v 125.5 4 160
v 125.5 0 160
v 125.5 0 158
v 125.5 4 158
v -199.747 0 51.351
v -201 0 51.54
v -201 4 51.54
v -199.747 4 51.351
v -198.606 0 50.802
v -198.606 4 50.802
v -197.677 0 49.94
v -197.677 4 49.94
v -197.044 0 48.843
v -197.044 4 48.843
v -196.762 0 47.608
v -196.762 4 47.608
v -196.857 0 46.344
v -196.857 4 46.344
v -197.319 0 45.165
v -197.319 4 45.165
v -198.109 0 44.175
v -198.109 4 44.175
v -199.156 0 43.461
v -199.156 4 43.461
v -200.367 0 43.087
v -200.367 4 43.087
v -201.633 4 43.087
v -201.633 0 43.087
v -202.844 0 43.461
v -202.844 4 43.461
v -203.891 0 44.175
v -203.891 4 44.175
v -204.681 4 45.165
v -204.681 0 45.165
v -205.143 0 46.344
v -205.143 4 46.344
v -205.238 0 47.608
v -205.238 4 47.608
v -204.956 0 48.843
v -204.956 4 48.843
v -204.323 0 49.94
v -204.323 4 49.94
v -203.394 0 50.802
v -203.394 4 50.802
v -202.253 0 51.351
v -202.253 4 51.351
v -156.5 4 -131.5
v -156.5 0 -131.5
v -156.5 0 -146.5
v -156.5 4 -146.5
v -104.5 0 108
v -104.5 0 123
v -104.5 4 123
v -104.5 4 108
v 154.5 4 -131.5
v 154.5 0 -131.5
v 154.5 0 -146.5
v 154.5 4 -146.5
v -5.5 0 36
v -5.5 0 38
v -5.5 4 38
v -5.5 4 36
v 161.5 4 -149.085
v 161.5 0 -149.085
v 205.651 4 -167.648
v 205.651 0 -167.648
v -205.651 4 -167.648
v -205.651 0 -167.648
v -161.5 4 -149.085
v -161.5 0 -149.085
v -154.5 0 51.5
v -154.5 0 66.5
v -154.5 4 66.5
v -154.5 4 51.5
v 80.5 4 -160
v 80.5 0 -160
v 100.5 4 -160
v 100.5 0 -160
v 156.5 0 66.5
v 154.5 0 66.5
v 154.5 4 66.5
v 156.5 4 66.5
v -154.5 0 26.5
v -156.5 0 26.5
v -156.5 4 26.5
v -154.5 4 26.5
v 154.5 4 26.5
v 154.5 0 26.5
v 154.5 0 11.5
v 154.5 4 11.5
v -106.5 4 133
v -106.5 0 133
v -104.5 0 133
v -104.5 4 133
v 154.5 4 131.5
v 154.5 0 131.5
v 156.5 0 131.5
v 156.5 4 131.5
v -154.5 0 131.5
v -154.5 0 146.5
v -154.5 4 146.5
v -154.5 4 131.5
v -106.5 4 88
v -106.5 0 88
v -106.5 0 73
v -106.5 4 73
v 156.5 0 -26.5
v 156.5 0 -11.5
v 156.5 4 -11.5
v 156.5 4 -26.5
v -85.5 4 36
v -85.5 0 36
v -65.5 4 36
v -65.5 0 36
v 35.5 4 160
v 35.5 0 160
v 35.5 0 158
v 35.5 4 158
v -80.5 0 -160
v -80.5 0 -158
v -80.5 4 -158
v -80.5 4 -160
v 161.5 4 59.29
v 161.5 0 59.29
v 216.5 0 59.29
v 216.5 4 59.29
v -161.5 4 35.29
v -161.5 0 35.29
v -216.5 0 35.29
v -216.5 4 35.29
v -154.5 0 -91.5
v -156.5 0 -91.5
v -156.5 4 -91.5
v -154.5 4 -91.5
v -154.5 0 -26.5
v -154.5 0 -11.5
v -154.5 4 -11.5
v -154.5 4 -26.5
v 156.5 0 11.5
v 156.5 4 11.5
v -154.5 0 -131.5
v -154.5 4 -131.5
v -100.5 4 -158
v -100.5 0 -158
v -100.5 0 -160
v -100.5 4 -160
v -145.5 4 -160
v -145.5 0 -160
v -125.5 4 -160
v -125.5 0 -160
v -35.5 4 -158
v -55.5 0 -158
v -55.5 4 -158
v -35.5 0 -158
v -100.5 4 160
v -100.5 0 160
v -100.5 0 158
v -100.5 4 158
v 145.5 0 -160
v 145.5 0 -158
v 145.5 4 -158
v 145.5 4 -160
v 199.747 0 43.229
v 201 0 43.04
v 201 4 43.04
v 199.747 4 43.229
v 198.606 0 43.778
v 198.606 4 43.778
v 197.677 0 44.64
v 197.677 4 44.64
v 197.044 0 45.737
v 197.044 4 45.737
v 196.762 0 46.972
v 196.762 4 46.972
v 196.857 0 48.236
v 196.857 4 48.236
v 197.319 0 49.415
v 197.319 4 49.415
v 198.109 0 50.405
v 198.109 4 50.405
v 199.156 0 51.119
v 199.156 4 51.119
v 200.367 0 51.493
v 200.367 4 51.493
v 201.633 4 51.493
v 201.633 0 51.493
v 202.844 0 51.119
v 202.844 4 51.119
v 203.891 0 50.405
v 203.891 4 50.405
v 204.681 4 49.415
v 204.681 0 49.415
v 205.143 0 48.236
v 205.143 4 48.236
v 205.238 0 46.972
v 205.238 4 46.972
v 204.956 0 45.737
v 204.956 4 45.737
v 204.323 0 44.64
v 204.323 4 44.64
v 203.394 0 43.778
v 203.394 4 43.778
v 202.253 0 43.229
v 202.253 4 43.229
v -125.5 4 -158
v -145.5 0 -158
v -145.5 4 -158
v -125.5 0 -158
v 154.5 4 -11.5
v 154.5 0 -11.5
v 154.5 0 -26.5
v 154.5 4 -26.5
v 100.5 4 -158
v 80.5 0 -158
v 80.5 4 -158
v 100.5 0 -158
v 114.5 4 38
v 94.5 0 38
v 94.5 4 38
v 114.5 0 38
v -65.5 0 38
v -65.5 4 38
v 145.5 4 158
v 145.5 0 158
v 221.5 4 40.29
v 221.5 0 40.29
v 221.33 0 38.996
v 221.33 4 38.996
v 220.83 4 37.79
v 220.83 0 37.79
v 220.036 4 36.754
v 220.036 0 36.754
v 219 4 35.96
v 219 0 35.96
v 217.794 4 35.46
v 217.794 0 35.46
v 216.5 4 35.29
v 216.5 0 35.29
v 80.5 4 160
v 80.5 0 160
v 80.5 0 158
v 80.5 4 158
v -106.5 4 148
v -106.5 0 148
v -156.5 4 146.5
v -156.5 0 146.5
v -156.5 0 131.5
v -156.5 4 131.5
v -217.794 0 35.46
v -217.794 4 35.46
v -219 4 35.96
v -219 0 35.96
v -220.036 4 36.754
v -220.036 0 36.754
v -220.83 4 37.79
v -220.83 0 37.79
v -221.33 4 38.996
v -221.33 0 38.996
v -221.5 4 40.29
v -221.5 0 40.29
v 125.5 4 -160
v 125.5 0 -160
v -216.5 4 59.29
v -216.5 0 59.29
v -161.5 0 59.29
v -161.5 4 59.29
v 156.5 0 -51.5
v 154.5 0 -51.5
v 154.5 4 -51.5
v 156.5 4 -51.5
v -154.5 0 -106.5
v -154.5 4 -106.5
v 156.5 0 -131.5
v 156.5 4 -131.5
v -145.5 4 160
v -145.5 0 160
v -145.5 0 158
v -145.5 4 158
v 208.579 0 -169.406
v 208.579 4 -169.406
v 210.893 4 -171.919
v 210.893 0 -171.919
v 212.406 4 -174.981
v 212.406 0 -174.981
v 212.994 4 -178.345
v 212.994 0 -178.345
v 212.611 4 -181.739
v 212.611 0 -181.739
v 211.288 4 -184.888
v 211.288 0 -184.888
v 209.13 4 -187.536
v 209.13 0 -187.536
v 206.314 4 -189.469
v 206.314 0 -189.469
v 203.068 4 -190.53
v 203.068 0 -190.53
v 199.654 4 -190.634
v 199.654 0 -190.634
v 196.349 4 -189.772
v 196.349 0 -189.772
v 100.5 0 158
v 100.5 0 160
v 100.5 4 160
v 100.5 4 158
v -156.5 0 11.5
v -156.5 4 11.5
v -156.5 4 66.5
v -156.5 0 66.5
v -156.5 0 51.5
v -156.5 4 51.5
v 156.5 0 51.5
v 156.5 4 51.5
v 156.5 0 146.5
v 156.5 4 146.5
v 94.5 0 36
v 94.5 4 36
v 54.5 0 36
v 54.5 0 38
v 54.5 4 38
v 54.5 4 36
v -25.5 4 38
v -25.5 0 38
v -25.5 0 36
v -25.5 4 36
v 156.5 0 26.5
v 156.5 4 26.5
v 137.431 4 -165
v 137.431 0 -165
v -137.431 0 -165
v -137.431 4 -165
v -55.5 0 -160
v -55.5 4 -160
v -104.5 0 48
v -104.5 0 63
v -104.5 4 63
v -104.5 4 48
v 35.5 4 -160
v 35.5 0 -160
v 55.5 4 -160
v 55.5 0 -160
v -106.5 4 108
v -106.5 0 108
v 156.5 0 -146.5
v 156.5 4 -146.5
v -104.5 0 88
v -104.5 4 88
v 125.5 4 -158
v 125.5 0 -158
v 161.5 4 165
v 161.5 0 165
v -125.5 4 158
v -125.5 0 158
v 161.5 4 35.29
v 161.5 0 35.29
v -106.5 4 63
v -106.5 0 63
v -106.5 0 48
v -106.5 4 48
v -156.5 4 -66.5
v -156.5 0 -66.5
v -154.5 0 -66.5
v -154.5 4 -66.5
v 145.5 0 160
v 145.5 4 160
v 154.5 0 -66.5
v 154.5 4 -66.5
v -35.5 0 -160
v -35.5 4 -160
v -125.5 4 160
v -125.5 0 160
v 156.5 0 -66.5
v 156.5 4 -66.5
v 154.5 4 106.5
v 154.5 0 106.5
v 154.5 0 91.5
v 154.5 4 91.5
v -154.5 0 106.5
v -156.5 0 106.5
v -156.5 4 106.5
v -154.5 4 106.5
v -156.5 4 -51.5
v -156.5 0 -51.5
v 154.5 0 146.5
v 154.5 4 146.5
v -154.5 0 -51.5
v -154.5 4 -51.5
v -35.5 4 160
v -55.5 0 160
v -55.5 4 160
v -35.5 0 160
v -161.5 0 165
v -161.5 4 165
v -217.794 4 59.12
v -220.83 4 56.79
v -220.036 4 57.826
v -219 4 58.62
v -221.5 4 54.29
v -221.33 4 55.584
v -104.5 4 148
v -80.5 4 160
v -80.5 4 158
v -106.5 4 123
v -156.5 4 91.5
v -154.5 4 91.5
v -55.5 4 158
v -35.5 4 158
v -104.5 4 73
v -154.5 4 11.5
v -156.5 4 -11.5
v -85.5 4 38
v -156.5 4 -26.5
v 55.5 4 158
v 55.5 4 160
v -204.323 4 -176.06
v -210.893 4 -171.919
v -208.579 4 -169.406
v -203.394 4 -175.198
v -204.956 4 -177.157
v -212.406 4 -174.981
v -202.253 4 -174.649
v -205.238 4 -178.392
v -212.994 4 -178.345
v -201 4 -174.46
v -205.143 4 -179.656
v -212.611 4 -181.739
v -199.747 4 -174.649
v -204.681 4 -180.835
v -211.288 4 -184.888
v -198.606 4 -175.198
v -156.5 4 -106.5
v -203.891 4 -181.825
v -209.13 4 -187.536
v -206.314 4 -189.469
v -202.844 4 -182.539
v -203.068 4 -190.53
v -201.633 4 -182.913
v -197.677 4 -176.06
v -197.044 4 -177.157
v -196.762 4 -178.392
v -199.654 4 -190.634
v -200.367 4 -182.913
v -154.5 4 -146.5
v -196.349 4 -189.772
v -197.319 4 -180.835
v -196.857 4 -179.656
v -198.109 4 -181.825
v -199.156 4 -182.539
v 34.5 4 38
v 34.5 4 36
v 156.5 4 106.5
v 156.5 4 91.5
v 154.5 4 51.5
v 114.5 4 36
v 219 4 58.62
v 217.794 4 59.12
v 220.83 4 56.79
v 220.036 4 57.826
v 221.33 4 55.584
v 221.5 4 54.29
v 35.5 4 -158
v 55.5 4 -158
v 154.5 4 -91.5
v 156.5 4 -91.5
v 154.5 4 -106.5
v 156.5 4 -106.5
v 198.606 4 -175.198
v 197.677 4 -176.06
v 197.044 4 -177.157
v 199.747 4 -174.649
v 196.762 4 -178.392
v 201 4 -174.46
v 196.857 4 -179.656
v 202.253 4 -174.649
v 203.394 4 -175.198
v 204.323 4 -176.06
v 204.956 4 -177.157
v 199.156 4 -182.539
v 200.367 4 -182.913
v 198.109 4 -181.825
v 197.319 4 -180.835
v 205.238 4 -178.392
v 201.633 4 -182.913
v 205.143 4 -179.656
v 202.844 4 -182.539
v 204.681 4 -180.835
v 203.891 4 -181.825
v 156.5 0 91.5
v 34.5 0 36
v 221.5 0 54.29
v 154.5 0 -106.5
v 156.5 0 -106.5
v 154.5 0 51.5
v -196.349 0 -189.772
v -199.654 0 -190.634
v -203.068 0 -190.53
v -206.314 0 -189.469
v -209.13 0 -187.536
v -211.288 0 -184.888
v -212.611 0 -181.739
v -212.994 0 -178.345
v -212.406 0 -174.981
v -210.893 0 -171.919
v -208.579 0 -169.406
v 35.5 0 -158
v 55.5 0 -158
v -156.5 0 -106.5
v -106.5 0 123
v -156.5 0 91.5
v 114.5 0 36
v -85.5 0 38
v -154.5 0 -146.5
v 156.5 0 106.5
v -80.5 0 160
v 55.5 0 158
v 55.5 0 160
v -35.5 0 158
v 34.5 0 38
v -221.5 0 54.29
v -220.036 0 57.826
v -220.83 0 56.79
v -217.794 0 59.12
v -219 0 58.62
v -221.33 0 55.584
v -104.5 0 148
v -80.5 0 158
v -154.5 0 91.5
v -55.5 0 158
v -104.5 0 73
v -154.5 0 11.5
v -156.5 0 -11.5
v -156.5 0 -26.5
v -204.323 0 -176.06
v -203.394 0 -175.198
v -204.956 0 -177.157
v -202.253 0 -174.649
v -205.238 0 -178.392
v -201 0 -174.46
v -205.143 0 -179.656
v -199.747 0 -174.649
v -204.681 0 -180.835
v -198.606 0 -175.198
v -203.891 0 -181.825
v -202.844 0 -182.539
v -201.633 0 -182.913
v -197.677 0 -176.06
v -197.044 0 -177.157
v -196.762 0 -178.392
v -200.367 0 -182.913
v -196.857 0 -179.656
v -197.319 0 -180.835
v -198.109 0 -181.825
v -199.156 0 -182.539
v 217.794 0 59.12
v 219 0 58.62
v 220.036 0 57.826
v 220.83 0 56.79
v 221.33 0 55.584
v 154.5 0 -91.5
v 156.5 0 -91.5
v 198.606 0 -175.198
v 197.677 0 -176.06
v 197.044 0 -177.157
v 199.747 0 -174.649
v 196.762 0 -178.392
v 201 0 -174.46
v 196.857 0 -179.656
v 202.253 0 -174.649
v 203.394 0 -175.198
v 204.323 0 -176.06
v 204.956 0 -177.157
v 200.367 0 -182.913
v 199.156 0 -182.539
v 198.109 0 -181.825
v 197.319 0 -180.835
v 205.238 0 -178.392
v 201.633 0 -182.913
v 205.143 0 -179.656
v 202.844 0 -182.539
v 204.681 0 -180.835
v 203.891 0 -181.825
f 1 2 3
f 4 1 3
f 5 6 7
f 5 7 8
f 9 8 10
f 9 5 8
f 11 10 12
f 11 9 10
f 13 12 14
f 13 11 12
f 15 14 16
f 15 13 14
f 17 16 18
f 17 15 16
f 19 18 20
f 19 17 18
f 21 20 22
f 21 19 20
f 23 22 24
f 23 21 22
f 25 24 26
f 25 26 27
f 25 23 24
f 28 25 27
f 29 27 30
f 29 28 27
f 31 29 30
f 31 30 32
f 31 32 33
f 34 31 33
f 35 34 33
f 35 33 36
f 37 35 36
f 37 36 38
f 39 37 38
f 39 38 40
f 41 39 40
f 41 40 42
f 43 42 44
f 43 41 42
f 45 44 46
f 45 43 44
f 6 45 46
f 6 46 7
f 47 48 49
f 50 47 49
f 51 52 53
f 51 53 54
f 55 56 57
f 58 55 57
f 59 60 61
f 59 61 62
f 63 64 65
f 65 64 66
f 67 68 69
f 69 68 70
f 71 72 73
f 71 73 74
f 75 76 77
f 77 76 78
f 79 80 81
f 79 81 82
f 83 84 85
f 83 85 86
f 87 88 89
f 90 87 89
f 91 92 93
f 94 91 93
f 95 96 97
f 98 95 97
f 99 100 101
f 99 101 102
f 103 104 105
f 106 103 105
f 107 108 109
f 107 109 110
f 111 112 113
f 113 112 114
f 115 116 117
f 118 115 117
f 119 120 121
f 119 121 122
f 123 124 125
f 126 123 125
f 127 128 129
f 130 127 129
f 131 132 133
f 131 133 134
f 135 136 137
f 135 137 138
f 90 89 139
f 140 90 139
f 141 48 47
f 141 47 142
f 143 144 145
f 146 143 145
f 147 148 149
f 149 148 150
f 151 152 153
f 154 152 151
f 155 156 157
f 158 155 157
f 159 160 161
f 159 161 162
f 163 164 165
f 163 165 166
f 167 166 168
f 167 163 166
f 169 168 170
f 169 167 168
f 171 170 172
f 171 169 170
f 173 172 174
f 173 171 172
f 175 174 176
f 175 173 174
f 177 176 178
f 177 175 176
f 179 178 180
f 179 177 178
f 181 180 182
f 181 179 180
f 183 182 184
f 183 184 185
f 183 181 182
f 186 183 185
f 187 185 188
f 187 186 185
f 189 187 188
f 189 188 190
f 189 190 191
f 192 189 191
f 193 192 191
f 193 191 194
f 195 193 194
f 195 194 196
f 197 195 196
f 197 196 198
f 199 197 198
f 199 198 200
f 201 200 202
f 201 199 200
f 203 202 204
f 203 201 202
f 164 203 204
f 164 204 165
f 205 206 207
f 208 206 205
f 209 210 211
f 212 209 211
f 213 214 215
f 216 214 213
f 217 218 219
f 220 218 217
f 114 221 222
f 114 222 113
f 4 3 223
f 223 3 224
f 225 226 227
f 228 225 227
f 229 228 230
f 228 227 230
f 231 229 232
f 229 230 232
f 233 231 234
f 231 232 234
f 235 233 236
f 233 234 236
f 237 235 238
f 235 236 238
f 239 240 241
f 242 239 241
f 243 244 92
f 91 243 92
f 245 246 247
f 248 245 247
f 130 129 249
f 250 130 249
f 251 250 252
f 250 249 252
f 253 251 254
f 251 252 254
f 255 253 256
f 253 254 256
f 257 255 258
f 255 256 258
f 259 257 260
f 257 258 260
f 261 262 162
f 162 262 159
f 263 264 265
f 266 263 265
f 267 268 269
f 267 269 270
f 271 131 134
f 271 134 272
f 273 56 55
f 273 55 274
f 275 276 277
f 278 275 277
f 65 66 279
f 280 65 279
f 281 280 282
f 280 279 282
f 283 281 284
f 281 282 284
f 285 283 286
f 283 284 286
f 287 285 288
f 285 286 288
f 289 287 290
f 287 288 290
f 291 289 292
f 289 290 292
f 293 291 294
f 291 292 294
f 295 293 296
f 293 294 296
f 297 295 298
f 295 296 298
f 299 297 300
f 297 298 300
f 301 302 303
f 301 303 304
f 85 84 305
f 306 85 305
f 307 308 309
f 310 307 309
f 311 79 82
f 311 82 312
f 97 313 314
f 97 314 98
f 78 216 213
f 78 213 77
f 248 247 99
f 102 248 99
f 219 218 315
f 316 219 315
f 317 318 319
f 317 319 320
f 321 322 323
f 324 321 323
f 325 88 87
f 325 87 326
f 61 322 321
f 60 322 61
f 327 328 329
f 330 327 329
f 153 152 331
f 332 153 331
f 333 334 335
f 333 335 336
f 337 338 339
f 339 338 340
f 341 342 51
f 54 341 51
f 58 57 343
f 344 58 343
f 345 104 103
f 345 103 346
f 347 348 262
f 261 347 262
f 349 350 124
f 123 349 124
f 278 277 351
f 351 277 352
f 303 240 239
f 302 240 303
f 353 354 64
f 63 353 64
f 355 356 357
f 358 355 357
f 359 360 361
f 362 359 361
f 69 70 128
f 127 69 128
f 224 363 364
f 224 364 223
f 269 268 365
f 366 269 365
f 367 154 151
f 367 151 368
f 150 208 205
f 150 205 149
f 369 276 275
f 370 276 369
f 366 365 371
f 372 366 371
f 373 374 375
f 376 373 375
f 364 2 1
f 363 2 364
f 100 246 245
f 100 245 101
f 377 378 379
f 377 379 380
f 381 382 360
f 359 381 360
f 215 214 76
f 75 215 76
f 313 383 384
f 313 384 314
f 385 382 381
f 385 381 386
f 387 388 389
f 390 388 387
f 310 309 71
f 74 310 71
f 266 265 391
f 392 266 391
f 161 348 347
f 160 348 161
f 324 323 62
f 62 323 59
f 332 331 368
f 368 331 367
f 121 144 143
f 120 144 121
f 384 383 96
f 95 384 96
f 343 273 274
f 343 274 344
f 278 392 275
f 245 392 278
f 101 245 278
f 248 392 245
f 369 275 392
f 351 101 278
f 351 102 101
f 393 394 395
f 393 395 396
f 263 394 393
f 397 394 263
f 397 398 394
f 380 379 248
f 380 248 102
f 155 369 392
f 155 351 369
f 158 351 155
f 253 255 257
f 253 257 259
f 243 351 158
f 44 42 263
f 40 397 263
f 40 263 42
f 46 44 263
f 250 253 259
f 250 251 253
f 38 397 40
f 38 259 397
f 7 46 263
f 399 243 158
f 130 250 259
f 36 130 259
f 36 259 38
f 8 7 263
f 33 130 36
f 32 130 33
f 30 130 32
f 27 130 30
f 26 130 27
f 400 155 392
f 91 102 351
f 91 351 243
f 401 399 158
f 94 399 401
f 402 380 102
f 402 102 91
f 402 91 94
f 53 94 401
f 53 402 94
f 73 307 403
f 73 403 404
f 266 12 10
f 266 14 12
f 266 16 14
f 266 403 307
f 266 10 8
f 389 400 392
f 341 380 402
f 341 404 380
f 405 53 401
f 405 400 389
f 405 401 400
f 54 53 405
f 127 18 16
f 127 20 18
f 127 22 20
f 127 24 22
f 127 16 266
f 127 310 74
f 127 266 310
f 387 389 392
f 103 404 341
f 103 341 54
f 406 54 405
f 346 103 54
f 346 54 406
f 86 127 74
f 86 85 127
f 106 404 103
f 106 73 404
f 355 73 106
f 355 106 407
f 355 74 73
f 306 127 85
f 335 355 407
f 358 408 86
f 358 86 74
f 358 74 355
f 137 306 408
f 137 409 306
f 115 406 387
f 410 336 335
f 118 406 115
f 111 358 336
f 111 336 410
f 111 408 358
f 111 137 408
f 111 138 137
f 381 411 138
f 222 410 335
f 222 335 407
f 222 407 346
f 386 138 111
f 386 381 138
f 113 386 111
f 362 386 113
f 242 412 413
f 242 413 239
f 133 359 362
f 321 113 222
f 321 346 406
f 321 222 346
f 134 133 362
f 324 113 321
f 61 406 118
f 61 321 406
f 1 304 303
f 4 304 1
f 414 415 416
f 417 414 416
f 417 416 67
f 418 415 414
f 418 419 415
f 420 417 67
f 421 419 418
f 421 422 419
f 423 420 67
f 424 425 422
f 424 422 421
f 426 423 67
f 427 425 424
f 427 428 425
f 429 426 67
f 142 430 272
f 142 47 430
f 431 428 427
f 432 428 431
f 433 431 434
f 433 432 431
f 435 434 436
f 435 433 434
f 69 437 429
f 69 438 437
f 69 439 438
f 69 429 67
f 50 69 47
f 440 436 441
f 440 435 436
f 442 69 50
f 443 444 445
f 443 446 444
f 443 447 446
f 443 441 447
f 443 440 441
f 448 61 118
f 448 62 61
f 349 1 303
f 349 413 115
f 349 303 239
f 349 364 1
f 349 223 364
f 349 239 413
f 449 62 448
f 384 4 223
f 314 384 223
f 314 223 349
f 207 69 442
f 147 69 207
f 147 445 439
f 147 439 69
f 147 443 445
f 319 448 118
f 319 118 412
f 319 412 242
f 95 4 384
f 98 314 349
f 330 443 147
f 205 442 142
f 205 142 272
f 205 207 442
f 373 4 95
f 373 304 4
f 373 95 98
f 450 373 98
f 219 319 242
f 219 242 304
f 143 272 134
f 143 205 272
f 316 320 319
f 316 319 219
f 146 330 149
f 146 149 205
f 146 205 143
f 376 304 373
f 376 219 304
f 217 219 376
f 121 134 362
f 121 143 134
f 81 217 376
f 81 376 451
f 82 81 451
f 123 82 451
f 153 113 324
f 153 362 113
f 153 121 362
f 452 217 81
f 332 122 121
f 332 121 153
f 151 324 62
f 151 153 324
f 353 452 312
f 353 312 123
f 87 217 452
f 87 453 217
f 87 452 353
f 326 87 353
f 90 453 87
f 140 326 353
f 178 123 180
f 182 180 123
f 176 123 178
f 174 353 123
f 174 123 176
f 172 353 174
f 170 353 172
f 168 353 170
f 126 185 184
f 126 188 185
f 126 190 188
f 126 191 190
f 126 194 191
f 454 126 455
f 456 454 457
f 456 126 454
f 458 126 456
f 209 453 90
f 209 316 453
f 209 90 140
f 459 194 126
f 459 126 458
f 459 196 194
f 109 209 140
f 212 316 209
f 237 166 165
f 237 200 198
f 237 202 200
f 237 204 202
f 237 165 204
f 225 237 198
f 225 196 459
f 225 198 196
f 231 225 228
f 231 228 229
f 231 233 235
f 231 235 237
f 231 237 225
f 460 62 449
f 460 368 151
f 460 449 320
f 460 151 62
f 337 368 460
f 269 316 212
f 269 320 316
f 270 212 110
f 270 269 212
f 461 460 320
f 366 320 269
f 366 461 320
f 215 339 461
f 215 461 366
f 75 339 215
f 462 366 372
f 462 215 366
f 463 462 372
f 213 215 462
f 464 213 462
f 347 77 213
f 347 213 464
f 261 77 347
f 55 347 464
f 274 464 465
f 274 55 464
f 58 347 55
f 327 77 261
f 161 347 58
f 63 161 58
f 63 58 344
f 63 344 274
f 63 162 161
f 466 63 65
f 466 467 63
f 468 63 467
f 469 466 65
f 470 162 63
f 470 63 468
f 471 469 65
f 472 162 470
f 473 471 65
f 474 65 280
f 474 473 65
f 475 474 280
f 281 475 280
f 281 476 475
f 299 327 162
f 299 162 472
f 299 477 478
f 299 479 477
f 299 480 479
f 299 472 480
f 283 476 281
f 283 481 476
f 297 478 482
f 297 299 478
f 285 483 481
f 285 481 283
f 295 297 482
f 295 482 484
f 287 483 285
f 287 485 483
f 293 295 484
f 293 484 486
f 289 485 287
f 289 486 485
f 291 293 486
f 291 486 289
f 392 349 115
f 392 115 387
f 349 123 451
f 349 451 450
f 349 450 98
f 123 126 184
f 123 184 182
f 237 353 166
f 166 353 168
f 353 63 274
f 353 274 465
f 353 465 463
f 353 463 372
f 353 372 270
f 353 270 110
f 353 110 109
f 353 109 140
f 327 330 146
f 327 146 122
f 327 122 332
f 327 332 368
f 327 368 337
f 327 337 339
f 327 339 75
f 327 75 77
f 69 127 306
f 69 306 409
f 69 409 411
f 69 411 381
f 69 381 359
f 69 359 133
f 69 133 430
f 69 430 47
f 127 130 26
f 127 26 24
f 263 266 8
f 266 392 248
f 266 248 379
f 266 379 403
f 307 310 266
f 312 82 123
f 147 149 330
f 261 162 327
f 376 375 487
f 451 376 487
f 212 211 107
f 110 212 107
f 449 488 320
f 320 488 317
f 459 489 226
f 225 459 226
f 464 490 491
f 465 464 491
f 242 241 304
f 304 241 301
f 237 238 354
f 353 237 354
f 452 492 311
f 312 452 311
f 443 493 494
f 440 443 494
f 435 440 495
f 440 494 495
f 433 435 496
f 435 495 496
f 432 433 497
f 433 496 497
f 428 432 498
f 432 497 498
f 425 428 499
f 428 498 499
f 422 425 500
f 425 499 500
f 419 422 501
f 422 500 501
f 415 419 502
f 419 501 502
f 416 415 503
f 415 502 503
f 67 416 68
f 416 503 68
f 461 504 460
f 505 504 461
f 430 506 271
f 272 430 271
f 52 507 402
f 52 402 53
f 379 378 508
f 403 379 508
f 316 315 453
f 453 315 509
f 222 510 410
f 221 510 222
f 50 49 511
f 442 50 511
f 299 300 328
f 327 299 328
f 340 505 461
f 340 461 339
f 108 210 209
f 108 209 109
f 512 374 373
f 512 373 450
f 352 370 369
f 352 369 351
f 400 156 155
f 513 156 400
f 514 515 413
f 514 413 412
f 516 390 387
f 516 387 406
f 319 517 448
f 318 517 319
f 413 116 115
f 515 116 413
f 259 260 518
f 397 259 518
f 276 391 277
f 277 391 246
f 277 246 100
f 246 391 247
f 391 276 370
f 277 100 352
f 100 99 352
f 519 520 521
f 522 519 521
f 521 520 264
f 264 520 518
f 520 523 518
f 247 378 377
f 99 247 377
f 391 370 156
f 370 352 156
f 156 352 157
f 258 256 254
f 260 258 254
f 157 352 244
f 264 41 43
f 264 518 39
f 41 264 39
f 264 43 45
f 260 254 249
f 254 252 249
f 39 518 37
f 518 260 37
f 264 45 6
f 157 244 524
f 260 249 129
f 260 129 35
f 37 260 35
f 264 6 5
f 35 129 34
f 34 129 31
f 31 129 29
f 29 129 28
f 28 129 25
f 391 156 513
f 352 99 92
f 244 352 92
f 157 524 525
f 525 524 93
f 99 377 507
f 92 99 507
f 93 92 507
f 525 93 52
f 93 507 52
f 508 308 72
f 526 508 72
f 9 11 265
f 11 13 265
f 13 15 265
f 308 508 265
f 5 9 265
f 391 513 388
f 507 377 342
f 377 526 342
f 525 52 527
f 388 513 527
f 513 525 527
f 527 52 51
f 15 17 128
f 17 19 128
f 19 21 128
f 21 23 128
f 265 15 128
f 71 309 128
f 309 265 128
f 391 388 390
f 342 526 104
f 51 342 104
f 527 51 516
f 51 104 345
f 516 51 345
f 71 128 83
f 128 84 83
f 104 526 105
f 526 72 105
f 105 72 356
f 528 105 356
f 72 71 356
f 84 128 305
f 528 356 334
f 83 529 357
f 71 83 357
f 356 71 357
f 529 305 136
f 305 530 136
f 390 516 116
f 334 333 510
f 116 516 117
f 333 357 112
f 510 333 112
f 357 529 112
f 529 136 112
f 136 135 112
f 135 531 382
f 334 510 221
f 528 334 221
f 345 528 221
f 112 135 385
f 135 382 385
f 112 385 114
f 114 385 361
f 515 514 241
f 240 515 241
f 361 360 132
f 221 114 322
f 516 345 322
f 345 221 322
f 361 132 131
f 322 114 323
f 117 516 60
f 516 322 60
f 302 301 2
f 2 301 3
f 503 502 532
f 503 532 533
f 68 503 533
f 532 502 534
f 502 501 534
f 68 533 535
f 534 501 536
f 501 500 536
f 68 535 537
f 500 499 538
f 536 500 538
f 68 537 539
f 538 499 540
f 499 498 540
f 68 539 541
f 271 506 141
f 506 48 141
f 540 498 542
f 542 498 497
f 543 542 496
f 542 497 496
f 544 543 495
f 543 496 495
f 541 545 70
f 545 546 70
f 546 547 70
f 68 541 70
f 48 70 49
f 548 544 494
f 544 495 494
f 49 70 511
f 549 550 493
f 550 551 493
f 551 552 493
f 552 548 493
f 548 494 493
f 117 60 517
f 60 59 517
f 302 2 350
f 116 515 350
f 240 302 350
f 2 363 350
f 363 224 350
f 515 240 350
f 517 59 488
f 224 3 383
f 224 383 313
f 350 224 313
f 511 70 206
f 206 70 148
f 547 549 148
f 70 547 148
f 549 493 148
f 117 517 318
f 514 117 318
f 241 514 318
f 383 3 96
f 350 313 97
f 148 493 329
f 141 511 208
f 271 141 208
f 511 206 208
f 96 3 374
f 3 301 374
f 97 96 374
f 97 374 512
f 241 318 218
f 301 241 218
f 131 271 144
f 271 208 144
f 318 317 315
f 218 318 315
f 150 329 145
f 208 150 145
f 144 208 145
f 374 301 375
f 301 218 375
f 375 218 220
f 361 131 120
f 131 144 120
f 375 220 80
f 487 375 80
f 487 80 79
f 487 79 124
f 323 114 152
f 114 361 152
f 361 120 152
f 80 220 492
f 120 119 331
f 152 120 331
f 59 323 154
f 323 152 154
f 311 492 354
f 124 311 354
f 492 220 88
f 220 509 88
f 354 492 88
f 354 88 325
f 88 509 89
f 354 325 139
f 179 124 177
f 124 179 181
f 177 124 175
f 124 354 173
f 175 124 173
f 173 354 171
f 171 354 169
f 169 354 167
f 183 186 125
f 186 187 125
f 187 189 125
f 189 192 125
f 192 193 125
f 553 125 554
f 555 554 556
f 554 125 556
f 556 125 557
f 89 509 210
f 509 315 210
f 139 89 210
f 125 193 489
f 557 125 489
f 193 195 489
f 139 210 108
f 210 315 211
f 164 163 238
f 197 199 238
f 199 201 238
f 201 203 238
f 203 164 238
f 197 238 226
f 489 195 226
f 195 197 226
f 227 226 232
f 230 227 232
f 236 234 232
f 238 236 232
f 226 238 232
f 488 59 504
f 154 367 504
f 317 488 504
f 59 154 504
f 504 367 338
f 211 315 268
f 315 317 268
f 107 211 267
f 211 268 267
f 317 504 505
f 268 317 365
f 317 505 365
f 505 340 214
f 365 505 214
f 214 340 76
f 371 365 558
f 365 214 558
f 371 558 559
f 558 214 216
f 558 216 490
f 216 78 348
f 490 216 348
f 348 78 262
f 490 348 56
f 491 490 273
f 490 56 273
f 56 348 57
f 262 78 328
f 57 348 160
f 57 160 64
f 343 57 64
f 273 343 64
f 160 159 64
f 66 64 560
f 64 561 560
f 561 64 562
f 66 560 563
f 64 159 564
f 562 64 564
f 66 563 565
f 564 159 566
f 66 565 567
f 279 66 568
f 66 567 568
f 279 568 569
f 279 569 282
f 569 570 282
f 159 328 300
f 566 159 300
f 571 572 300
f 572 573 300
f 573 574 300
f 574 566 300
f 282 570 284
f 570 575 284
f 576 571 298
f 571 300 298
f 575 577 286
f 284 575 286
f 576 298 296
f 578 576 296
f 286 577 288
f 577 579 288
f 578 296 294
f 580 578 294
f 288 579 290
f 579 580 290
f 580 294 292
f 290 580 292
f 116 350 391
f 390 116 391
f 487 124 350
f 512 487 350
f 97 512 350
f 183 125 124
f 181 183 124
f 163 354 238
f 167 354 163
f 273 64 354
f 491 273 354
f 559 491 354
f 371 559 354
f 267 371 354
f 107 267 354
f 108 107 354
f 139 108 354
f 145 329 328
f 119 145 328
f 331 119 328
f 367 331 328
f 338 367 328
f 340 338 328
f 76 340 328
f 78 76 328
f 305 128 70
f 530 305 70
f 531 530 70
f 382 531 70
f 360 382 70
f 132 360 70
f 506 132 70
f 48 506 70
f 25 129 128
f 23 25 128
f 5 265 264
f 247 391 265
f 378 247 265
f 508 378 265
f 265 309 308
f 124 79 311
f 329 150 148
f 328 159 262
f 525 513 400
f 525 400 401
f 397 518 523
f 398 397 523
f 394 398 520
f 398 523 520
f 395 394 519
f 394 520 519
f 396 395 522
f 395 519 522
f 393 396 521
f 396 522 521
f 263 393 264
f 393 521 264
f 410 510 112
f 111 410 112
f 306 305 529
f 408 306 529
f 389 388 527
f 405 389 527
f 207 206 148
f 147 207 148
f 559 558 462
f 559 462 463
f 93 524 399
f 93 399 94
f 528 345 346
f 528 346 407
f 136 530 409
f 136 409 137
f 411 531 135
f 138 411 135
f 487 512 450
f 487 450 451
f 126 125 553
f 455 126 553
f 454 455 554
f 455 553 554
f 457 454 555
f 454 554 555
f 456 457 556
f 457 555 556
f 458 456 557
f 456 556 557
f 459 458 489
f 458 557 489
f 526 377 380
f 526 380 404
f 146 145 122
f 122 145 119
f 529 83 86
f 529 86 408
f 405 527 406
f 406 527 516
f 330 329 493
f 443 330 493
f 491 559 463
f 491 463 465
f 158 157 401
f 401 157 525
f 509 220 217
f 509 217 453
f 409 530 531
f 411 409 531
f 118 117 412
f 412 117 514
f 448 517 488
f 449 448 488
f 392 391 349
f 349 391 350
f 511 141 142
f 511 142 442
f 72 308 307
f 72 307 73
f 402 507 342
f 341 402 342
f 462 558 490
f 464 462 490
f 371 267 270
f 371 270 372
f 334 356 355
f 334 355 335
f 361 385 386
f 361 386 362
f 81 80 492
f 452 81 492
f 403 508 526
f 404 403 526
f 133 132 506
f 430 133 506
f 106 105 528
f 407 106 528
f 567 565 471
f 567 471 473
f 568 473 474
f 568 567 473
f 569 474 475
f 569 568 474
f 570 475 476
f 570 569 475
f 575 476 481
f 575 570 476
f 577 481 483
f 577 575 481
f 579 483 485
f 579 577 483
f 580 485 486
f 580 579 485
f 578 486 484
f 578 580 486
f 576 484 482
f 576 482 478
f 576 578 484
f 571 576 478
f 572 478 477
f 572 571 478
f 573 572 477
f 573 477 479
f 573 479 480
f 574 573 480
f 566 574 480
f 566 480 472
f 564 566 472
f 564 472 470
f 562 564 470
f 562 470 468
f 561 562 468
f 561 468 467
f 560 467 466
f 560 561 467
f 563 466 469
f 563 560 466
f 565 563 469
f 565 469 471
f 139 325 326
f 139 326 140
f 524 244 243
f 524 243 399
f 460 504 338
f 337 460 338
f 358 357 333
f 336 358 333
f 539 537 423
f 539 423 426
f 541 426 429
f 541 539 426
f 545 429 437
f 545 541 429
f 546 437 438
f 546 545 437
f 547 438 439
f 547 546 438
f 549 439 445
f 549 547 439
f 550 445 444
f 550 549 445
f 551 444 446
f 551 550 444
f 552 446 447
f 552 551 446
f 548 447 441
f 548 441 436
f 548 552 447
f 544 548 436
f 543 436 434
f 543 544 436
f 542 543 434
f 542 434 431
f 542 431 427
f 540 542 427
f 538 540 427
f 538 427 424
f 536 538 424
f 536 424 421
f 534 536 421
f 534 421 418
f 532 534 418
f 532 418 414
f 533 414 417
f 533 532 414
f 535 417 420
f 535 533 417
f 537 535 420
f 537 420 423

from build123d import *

# Parameters (mm, degrees)
SKETCH1_R           = 4.25
SKETCH1_W           = 2
SKETCH1_H           = 15
SKETCH1_W_2         = 20
SKETCH1_H_2         = 2
BOSS_EXTRUDE1_DEPTH = 4


with BuildPart() as part:
    # Sketch1 → Boss-Extrude1 (new body)
    with BuildSketch(Plane(origin=(0, 0, 0), x_dir=(1, 0, 0), z_dir=(0, 1, 0))):
        with BuildLine():
            Line((-161.5, -165), (161.5, -165))
            Line((161.5, -165), (161.5, -59.29))
            Line((161.5, -59.29), (216.5, -59.29))
            ThreePointArc((216.5, -59.29), (220.035533906, -57.825533906), (221.5, -54.29))
            Line((221.5, -54.29), (221.5, -47.29))
            Line((221.5, -47.29), (221.5, -40.29))
            ThreePointArc((221.5, -40.29), (220.035533906, -36.754466094), (216.5, -35.29))
            Line((216.5, -35.29), (161.5, -35.29))
            Line((161.5, -35.29), (161.5, 149.084720808))
            Line((161.5, 149.084720808), (205.651015663, 167.64799054))
            ThreePointArc((205.651015663, 167.64799054), (212.06200946, 183.361015663), (196.348984337, 189.77200946))
            Line((196.348984337, 189.77200946), (137.431056973, 165))
            Line((137.431056973, 165), (-137.431056973, 165))
            Line((-137.431056973, 165), (-196.348984337, 189.77200946))
            ThreePointArc((-196.348984337, 189.77200946), (-212.06200946, 183.361015663), (-205.651015663, 167.64799054))
            Line((-205.651015663, 167.64799054), (-161.5, 149.084720808))
            Line((-161.5, 149.084720808), (-161.5, -35.29))
            Line((-161.5, -35.29), (-216.5, -35.29))
            ThreePointArc((-216.5, -35.29), (-220.035533906, -36.754466094), (-221.5, -40.29))
            Line((-221.5, -40.29), (-221.5, -47.29))
            Line((-221.5, -47.29), (-221.5, -54.29))
            ThreePointArc((-221.5, -54.29), (-220.035533906, -57.825533906), (-216.5, -59.29))
            Line((-216.5, -59.29), (-161.5, -59.29))
            Line((-161.5, -59.29), (-161.5, -165))
        make_face()
        with Locations(Location((-201, -47.29, 0), (0, 0, 270))):
            Circle(SKETCH1_R, mode=Mode.SUBTRACT)
        with Locations(Location((201, -47.29, 0), (0, 0, 90))):
            Circle(SKETCH1_R, mode=Mode.SUBTRACT)
        with Locations(Location((-201, 178.71, 0), (0, 0, 270))):
            Circle(SKETCH1_R, mode=Mode.SUBTRACT)
        with Locations(Location((201, 178.71, 0), (0, 0, 270))):
            Circle(SKETCH1_R, mode=Mode.SUBTRACT)
        with Locations((155.5, 99)):
            Rectangle(SKETCH1_W, SKETCH1_H, mode=Mode.SUBTRACT)
        with Locations((155.5, 139)):
            Rectangle(SKETCH1_W, SKETCH1_H, mode=Mode.SUBTRACT)
        with Locations((155.5, 59)):
            Rectangle(SKETCH1_W, SKETCH1_H, mode=Mode.SUBTRACT)
        with Locations((155.5, 19)):
            Rectangle(SKETCH1_W, SKETCH1_H, mode=Mode.SUBTRACT)
        with Locations((90.5, 159)):
            Rectangle(SKETCH1_W_2, SKETCH1_H_2, mode=Mode.SUBTRACT)
        with Locations((135.5, 159)):
            Rectangle(SKETCH1_W_2, SKETCH1_H_2, mode=Mode.SUBTRACT)
        with Locations((45.5, 159)):
            Rectangle(SKETCH1_W_2, SKETCH1_H_2, mode=Mode.SUBTRACT)
        with Locations((-45.5, 159)):
            Rectangle(SKETCH1_W_2, SKETCH1_H_2, mode=Mode.SUBTRACT)
        with Locations((-135.5, 159)):
            Rectangle(SKETCH1_W_2, SKETCH1_H_2, mode=Mode.SUBTRACT)
        with Locations((-90.5, 159)):
            Rectangle(SKETCH1_W_2, SKETCH1_H_2, mode=Mode.SUBTRACT)
        with Locations((-155.5, 59)):
            Rectangle(SKETCH1_W, SKETCH1_H, mode=Mode.SUBTRACT)
        with Locations((-155.5, 19)):
            Rectangle(SKETCH1_W, SKETCH1_H, mode=Mode.SUBTRACT)
        with Locations((-155.5, 99)):
            Rectangle(SKETCH1_W, SKETCH1_H, mode=Mode.SUBTRACT)
        with Locations((-155.5, 139)):
            Rectangle(SKETCH1_W, SKETCH1_H, mode=Mode.SUBTRACT)
        with Locations((-155.5, -99)):
            Rectangle(SKETCH1_W, SKETCH1_H, mode=Mode.SUBTRACT)
        with Locations((-135.5, -159)):
            Rectangle(SKETCH1_W_2, SKETCH1_H_2, mode=Mode.SUBTRACT)
        with Locations((-155.5, -139)):
            Rectangle(SKETCH1_W, SKETCH1_H, mode=Mode.SUBTRACT)
        with Locations((-155.5, -59)):
            Rectangle(SKETCH1_W, SKETCH1_H, mode=Mode.SUBTRACT)
        with Locations((-155.5, -19)):
            Rectangle(SKETCH1_W, SKETCH1_H, mode=Mode.SUBTRACT)
        with Locations((-90.5, -159)):
            Rectangle(SKETCH1_W_2, SKETCH1_H_2, mode=Mode.SUBTRACT)
        with Locations((-45.5, -159)):
            Rectangle(SKETCH1_W_2, SKETCH1_H_2, mode=Mode.SUBTRACT)
        with Locations((155.5, -19)):
            Rectangle(SKETCH1_W, SKETCH1_H, mode=Mode.SUBTRACT)
        with Locations((155.5, -59)):
            Rectangle(SKETCH1_W, SKETCH1_H, mode=Mode.SUBTRACT)
        with Locations((155.5, -99)):
            Rectangle(SKETCH1_W, SKETCH1_H, mode=Mode.SUBTRACT)
        with Locations((155.5, -139)):
            Rectangle(SKETCH1_W, SKETCH1_H, mode=Mode.SUBTRACT)
        with Locations((135.5, -159)):
            Rectangle(SKETCH1_W_2, SKETCH1_H_2, mode=Mode.SUBTRACT)
        with Locations((90.5, -159)):
            Rectangle(SKETCH1_W_2, SKETCH1_H_2, mode=Mode.SUBTRACT)
        with Locations((45.5, -159)):
            Rectangle(SKETCH1_W_2, SKETCH1_H_2, mode=Mode.SUBTRACT)
        with Locations((104.5, -37)):
            Rectangle(SKETCH1_W_2, SKETCH1_H_2, mode=Mode.SUBTRACT)
        with Locations((44.5, -37)):
            Rectangle(SKETCH1_W_2, SKETCH1_H_2, mode=Mode.SUBTRACT)
        with Locations((-15.5, -37)):
            Rectangle(SKETCH1_W_2, SKETCH1_H_2, mode=Mode.SUBTRACT)
        with Locations((-75.5, -37)):
            Rectangle(SKETCH1_W_2, SKETCH1_H_2, mode=Mode.SUBTRACT)
        with Locations((-105.5, -80.5)):
            Rectangle(SKETCH1_W, SKETCH1_H, mode=Mode.SUBTRACT)
        with Locations((-105.5, -140.5)):
            Rectangle(SKETCH1_W, SKETCH1_H, mode=Mode.SUBTRACT)
        with Locations((-105.5, -115.5)):
            Rectangle(SKETCH1_W, SKETCH1_H, mode=Mode.SUBTRACT)
        with Locations((-105.5, -55.5)):
            Rectangle(SKETCH1_W, SKETCH1_H, mode=Mode.SUBTRACT)
    extrude(amount=BOSS_EXTRUDE1_DEPTH)


solid = part.part
